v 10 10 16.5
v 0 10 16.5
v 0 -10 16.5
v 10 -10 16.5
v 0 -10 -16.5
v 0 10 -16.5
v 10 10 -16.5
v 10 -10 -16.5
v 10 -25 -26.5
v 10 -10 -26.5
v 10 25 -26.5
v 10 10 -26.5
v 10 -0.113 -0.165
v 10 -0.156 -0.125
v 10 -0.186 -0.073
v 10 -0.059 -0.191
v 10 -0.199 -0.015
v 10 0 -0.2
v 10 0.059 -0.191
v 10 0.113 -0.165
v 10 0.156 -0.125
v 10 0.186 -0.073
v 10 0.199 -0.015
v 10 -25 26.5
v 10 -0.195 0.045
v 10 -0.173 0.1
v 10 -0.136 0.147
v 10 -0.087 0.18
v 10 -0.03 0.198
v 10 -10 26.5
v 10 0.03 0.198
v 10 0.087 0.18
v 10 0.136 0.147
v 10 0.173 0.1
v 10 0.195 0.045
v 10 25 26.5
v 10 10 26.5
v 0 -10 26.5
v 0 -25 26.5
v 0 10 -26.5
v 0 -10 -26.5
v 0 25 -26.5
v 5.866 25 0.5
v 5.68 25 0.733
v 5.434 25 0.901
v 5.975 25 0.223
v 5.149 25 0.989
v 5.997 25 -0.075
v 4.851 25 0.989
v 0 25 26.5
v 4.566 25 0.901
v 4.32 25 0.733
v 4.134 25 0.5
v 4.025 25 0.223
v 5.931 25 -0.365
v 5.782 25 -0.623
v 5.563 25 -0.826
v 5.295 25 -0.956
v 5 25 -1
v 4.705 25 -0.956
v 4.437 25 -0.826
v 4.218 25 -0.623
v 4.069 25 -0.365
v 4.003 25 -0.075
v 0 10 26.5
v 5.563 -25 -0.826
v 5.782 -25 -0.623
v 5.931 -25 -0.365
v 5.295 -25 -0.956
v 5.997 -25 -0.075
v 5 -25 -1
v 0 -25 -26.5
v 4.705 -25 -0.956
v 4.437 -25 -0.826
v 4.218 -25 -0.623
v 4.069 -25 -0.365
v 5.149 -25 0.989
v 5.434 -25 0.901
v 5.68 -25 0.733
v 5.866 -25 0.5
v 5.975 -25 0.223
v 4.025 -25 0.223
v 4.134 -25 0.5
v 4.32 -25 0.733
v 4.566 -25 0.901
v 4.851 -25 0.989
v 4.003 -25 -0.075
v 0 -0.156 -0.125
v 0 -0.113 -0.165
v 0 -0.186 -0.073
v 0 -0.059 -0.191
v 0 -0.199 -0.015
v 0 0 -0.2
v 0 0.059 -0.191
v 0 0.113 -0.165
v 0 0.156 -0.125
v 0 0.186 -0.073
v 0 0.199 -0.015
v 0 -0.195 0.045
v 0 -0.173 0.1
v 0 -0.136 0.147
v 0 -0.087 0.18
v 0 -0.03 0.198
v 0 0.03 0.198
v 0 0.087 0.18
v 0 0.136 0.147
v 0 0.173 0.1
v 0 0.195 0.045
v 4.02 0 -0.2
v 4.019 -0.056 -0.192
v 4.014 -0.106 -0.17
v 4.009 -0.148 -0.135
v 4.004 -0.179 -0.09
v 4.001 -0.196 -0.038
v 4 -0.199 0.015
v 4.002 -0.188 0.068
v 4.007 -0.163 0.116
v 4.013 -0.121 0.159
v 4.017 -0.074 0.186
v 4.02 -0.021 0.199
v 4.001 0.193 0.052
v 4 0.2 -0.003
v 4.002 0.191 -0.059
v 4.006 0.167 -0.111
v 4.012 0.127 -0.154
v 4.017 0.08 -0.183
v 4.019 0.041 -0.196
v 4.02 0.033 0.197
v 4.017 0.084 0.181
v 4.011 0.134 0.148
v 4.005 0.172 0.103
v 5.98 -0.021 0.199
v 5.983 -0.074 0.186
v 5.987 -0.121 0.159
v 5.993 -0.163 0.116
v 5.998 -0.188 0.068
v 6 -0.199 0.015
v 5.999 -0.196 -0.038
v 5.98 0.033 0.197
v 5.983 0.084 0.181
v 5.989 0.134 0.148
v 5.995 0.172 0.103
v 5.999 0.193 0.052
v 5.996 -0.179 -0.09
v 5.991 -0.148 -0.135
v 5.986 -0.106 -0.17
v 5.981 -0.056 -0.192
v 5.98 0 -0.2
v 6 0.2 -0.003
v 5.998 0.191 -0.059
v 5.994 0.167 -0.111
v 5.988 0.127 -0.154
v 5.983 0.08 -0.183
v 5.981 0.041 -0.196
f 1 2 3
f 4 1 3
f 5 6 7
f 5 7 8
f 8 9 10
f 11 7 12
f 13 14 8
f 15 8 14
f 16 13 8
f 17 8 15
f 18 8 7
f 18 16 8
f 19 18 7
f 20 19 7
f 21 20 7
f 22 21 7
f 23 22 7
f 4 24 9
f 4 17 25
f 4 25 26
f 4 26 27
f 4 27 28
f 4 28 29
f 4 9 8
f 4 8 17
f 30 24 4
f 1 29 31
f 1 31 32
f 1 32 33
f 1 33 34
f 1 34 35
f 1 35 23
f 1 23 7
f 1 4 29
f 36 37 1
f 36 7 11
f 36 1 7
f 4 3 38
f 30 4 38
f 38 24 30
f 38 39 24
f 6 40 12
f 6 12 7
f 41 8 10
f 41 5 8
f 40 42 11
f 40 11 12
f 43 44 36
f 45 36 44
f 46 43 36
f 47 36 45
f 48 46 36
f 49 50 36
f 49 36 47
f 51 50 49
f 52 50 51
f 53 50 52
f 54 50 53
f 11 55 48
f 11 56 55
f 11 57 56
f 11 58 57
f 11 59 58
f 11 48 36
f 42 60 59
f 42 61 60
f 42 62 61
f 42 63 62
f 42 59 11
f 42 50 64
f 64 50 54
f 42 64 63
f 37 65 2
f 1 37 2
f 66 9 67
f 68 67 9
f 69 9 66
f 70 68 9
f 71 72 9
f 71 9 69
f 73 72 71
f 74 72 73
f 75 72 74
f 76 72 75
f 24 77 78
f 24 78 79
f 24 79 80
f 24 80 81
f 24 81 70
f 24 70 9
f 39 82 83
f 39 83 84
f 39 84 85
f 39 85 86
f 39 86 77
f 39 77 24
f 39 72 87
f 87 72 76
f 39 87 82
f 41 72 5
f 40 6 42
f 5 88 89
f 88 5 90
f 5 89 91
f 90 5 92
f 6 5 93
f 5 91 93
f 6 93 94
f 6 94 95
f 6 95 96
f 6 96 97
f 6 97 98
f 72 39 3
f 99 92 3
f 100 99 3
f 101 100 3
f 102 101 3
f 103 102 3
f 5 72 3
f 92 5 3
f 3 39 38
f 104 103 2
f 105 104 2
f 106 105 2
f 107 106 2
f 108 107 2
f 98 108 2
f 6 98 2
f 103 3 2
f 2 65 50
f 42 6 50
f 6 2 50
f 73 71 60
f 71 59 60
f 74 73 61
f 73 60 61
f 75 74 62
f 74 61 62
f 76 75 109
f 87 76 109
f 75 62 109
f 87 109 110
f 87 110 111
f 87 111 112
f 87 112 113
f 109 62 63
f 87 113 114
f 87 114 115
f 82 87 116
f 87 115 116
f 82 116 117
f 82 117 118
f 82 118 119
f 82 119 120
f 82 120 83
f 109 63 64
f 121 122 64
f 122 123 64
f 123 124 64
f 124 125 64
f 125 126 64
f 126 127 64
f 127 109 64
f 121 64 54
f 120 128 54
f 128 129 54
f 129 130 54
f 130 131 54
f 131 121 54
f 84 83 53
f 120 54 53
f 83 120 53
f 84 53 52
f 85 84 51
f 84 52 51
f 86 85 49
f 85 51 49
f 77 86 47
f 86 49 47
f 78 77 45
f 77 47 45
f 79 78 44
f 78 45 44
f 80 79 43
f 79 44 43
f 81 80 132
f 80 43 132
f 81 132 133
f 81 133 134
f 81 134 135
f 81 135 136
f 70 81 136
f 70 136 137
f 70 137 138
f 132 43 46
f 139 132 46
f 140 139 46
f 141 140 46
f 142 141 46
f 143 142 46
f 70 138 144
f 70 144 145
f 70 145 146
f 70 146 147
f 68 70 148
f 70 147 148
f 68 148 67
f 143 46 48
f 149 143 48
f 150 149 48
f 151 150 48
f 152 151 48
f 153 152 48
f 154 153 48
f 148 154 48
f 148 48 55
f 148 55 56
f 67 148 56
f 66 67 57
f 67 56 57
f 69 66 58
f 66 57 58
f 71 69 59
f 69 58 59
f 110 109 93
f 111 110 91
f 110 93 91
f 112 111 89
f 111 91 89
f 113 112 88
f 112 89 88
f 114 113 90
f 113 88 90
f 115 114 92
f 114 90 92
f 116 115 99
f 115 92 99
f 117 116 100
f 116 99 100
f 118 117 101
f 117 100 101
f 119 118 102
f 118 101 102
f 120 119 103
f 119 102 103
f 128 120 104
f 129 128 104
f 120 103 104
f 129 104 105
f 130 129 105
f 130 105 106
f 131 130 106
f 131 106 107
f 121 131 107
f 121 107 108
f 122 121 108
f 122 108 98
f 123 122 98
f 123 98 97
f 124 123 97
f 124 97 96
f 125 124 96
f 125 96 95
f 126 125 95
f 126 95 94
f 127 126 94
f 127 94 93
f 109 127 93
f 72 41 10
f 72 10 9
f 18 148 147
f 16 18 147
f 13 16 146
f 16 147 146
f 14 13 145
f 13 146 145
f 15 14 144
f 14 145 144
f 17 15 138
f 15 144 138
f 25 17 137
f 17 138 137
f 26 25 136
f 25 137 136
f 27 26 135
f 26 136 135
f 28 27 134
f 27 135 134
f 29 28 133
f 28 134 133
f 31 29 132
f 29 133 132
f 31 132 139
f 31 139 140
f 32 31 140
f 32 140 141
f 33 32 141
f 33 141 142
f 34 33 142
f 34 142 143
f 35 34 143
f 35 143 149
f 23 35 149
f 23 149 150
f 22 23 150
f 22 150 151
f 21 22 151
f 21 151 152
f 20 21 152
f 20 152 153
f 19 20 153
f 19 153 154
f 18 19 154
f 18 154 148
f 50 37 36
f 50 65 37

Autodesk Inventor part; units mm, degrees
ref_plane "YZ Plane" through (0, 0, 0) normal (1, 0, 0) x (0, 1, 0)
ref_plane "XZ Plane" through (0, 0, 0) normal (0, 1, 0) x (-1, 0, 0)
ref_plane "XY Plane" through (0, 0, 0) normal (0, 0, 1) x (1, 0, 0)
sketch "Sketch3" plane through (0, 0, 0) normal (1, 0, 0) x (0, 1, 0)
  line L0 (25, -26.5) -> (-25, -26.5)
  line L1 (-25, -26.5) -> (-25, 26.5)
  line L2 (-25, 26.5) -> (25, 26.5)
  line L3 (25, 26.5) -> (25, -26.5)
  line L4 (25, -26.5) -> (-25, 26.5) construction
  line L5 (-25, -26.5) -> (25, 26.5) construction
  line L6 (25, 26.5) -> (10, 26.5)
  line L7 (10, 26.5) -> (10, 16.5)
  line L8 (10, 16.5) -> (-10, 16.5)
  line L9 (-10, 16.5) -> (-10, 26.5)
  line L10 (-10, 26.5) -> (-25, 26.5)
  line L11 (25, -26.5) -> (10, -26.5)
  line L12 (10, -26.5) -> (10, -16.5)
  line L13 (10, -16.5) -> (-10, -16.5)
  line L14 (-10, -16.5) -> (-10, -26.5)
  line L15 (-10, -26.5) -> (-25, -26.5)
  point P0 (0, 0)
  dimension "d0" = 50
  dimension "d1" = 53
  dimension "d2" = 15
  dimension "d3" = 10
  dimension "d4" = 20
  dimension "d5" = 10
  dimension "d6" = 15
  dimension "d7" = 10
  dimension "d8" = 20
  dimension "d9" = 10
  dimension "d10" = 15
extrude "Extrusion1" add sketch "Sketch3" along normal blind 10 contours L0 L12 L13 L14 L1 L2 L9 L8 L7 L3
sketch "Sketch5" plane through (10, 0, 0) normal (1, 0, 0) x (0, 0, -1)
  circle A0 centre (0, 0) radius 0.2
  dimension "d13" = 0.4
hole "Hole1" at (10, 0, 0) direction (-1, 0, 0) diameter 0.4 depth 10
sketch "Sketch6" plane through (0, -25, -26.5) normal (0, -1, 0) x (1, 0, 0)
  circle A0 centre (5, 26.5) radius 2.5
hole "Hole2" at (5, -25, 0) direction (0, 1, 0) diameter 2 depth 50
properties part number "prepazka_kola"
